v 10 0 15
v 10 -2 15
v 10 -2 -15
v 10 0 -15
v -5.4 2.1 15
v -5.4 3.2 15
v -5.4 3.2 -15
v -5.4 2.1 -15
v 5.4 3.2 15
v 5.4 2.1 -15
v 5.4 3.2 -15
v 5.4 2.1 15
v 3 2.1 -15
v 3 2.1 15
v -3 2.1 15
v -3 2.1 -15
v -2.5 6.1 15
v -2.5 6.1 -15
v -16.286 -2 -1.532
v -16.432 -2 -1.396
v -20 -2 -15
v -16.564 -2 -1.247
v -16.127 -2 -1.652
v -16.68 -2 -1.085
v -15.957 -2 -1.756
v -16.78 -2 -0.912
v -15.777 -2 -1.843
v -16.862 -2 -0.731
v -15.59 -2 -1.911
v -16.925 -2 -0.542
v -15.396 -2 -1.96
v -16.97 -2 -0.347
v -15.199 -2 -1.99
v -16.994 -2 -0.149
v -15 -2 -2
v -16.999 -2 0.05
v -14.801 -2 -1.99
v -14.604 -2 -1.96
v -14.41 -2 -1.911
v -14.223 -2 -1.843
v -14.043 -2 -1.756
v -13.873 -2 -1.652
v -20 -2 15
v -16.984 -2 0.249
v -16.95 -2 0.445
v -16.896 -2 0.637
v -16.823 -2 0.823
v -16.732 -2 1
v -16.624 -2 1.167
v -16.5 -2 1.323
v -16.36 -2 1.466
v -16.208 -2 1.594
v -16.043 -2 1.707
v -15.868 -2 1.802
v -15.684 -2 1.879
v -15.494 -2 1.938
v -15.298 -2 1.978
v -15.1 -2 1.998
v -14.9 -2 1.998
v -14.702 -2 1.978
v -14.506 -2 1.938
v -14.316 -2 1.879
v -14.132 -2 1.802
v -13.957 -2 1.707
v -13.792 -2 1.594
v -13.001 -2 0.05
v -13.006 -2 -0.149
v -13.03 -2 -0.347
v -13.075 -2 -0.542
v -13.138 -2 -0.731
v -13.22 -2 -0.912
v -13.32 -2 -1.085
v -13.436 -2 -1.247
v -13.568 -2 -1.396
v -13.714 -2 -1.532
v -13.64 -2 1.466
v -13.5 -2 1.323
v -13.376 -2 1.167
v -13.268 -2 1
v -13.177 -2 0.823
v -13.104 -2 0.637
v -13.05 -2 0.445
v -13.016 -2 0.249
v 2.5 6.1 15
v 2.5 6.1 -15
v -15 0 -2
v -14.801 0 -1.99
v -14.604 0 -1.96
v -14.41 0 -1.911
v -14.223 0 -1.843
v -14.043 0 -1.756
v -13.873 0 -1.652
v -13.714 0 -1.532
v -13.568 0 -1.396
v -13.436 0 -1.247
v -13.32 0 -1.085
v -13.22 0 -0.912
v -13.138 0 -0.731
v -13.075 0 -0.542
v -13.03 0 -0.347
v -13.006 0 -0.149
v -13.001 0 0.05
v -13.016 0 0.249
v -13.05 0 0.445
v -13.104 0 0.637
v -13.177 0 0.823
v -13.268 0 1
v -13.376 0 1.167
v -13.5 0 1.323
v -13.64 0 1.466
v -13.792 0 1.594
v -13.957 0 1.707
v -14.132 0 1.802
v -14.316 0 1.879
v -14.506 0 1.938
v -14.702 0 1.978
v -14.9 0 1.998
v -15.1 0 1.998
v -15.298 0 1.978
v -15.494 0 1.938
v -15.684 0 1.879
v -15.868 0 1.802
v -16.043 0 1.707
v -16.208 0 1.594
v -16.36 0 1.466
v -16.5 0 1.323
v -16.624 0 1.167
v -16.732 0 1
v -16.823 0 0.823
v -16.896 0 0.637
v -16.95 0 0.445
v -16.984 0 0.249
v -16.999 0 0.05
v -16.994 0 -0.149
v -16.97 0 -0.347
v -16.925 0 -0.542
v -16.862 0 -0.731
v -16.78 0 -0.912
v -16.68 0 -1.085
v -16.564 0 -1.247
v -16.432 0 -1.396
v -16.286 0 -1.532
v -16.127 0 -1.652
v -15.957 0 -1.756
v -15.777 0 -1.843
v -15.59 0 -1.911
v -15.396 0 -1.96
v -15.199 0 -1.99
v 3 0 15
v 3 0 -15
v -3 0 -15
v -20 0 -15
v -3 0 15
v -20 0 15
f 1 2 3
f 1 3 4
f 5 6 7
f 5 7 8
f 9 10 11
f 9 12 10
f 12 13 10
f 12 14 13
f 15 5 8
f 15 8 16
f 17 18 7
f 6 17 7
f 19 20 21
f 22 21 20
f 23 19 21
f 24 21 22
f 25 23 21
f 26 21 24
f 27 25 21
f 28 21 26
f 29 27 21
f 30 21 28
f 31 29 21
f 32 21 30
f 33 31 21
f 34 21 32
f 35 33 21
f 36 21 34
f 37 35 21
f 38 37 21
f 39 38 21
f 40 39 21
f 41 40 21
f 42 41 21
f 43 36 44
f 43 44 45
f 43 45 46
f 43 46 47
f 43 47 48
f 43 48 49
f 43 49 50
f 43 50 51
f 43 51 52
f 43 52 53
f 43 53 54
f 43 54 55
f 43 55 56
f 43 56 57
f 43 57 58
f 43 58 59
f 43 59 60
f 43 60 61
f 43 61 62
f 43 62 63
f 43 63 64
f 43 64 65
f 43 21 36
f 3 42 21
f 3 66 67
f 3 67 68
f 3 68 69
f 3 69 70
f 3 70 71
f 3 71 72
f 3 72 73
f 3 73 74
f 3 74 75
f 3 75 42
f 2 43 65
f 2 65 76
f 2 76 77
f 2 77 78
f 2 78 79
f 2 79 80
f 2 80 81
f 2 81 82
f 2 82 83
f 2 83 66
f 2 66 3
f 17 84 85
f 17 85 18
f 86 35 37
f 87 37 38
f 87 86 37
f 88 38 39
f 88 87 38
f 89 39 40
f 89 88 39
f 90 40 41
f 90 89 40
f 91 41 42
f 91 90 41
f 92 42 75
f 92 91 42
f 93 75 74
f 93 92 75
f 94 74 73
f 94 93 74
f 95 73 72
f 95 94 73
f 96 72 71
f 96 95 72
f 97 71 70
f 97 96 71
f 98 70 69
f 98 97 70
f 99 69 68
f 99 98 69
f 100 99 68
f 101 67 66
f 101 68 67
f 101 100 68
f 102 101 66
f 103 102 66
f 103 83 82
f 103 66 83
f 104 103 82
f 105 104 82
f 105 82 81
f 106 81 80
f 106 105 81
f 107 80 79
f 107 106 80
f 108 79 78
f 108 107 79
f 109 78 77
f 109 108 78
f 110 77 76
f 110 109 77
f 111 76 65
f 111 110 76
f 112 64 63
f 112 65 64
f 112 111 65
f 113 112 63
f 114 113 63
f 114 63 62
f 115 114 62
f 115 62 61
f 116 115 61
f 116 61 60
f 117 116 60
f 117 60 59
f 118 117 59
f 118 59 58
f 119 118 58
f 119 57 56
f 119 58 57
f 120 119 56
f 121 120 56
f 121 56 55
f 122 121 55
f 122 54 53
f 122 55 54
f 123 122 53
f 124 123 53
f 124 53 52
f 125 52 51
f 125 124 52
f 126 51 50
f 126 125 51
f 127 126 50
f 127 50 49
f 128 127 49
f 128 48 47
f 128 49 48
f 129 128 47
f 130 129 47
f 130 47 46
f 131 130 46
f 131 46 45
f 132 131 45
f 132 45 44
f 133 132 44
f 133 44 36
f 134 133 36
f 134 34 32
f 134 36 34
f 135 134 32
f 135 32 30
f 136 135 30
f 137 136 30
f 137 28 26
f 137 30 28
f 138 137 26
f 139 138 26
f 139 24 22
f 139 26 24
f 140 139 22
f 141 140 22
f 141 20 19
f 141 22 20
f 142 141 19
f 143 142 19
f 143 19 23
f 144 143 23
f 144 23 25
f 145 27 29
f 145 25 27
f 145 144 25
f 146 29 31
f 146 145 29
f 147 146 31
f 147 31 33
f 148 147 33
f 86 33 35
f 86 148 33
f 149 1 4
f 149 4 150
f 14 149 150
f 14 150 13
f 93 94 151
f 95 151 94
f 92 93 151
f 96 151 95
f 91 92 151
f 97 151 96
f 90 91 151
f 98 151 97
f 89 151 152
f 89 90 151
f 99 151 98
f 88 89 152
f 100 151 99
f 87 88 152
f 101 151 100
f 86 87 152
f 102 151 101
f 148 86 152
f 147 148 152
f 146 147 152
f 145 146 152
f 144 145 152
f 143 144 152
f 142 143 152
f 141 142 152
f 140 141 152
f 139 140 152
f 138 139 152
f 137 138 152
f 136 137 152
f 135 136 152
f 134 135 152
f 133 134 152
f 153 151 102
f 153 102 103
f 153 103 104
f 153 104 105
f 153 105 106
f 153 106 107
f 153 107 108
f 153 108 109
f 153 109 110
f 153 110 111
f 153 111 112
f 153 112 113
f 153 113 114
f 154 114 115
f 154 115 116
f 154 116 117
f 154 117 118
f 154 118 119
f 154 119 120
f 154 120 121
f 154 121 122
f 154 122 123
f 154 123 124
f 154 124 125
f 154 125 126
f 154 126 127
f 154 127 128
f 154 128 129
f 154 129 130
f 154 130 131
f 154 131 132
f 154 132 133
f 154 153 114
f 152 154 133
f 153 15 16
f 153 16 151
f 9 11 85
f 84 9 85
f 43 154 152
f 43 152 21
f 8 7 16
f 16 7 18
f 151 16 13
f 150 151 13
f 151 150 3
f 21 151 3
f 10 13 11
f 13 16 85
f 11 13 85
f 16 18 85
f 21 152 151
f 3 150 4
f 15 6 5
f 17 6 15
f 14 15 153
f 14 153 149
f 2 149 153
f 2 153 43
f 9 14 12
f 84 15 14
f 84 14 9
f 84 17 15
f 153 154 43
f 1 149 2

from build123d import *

# Parameters (mm, degrees)
BOSS_EXTRUDE2_DEPTH = 15
SKETCH4_R           = 2
CUT_EXTRUDE1_DEPTH  = 32.483487736


with BuildPart() as part:
    # Sketch2 → Boss-Extrude2 (new, symmetric)
    with BuildSketch(Plane.XY):
        Polygon((5.4, 3.2), (2.5, 6.1), (-2.5, 6.1), (-5.4, 3.2), (-5.4, 2.1), (-3, 2.1), (-3, 0), (-20, 0), (-20, -2), (10, -2), (10, 0), (3, 0), (3, 2.1), (5.4, 2.1), align=None)
    extrude(amount=BOSS_EXTRUDE2_DEPTH, both=True)

    # Sketch4 → Cut-Extrude1 (cut, through all)
    with BuildSketch(Plane(origin=(7, 0, 0), x_dir=(0, 0, 1), z_dir=(0, -1, 0))):
        with Locations(Location((0, 22, 0), (0, 0, 180))):
            Circle(SKETCH4_R)
    extrude(amount=CUT_EXTRUDE1_DEPTH, mode=Mode.SUBTRACT)


solid = part.part
